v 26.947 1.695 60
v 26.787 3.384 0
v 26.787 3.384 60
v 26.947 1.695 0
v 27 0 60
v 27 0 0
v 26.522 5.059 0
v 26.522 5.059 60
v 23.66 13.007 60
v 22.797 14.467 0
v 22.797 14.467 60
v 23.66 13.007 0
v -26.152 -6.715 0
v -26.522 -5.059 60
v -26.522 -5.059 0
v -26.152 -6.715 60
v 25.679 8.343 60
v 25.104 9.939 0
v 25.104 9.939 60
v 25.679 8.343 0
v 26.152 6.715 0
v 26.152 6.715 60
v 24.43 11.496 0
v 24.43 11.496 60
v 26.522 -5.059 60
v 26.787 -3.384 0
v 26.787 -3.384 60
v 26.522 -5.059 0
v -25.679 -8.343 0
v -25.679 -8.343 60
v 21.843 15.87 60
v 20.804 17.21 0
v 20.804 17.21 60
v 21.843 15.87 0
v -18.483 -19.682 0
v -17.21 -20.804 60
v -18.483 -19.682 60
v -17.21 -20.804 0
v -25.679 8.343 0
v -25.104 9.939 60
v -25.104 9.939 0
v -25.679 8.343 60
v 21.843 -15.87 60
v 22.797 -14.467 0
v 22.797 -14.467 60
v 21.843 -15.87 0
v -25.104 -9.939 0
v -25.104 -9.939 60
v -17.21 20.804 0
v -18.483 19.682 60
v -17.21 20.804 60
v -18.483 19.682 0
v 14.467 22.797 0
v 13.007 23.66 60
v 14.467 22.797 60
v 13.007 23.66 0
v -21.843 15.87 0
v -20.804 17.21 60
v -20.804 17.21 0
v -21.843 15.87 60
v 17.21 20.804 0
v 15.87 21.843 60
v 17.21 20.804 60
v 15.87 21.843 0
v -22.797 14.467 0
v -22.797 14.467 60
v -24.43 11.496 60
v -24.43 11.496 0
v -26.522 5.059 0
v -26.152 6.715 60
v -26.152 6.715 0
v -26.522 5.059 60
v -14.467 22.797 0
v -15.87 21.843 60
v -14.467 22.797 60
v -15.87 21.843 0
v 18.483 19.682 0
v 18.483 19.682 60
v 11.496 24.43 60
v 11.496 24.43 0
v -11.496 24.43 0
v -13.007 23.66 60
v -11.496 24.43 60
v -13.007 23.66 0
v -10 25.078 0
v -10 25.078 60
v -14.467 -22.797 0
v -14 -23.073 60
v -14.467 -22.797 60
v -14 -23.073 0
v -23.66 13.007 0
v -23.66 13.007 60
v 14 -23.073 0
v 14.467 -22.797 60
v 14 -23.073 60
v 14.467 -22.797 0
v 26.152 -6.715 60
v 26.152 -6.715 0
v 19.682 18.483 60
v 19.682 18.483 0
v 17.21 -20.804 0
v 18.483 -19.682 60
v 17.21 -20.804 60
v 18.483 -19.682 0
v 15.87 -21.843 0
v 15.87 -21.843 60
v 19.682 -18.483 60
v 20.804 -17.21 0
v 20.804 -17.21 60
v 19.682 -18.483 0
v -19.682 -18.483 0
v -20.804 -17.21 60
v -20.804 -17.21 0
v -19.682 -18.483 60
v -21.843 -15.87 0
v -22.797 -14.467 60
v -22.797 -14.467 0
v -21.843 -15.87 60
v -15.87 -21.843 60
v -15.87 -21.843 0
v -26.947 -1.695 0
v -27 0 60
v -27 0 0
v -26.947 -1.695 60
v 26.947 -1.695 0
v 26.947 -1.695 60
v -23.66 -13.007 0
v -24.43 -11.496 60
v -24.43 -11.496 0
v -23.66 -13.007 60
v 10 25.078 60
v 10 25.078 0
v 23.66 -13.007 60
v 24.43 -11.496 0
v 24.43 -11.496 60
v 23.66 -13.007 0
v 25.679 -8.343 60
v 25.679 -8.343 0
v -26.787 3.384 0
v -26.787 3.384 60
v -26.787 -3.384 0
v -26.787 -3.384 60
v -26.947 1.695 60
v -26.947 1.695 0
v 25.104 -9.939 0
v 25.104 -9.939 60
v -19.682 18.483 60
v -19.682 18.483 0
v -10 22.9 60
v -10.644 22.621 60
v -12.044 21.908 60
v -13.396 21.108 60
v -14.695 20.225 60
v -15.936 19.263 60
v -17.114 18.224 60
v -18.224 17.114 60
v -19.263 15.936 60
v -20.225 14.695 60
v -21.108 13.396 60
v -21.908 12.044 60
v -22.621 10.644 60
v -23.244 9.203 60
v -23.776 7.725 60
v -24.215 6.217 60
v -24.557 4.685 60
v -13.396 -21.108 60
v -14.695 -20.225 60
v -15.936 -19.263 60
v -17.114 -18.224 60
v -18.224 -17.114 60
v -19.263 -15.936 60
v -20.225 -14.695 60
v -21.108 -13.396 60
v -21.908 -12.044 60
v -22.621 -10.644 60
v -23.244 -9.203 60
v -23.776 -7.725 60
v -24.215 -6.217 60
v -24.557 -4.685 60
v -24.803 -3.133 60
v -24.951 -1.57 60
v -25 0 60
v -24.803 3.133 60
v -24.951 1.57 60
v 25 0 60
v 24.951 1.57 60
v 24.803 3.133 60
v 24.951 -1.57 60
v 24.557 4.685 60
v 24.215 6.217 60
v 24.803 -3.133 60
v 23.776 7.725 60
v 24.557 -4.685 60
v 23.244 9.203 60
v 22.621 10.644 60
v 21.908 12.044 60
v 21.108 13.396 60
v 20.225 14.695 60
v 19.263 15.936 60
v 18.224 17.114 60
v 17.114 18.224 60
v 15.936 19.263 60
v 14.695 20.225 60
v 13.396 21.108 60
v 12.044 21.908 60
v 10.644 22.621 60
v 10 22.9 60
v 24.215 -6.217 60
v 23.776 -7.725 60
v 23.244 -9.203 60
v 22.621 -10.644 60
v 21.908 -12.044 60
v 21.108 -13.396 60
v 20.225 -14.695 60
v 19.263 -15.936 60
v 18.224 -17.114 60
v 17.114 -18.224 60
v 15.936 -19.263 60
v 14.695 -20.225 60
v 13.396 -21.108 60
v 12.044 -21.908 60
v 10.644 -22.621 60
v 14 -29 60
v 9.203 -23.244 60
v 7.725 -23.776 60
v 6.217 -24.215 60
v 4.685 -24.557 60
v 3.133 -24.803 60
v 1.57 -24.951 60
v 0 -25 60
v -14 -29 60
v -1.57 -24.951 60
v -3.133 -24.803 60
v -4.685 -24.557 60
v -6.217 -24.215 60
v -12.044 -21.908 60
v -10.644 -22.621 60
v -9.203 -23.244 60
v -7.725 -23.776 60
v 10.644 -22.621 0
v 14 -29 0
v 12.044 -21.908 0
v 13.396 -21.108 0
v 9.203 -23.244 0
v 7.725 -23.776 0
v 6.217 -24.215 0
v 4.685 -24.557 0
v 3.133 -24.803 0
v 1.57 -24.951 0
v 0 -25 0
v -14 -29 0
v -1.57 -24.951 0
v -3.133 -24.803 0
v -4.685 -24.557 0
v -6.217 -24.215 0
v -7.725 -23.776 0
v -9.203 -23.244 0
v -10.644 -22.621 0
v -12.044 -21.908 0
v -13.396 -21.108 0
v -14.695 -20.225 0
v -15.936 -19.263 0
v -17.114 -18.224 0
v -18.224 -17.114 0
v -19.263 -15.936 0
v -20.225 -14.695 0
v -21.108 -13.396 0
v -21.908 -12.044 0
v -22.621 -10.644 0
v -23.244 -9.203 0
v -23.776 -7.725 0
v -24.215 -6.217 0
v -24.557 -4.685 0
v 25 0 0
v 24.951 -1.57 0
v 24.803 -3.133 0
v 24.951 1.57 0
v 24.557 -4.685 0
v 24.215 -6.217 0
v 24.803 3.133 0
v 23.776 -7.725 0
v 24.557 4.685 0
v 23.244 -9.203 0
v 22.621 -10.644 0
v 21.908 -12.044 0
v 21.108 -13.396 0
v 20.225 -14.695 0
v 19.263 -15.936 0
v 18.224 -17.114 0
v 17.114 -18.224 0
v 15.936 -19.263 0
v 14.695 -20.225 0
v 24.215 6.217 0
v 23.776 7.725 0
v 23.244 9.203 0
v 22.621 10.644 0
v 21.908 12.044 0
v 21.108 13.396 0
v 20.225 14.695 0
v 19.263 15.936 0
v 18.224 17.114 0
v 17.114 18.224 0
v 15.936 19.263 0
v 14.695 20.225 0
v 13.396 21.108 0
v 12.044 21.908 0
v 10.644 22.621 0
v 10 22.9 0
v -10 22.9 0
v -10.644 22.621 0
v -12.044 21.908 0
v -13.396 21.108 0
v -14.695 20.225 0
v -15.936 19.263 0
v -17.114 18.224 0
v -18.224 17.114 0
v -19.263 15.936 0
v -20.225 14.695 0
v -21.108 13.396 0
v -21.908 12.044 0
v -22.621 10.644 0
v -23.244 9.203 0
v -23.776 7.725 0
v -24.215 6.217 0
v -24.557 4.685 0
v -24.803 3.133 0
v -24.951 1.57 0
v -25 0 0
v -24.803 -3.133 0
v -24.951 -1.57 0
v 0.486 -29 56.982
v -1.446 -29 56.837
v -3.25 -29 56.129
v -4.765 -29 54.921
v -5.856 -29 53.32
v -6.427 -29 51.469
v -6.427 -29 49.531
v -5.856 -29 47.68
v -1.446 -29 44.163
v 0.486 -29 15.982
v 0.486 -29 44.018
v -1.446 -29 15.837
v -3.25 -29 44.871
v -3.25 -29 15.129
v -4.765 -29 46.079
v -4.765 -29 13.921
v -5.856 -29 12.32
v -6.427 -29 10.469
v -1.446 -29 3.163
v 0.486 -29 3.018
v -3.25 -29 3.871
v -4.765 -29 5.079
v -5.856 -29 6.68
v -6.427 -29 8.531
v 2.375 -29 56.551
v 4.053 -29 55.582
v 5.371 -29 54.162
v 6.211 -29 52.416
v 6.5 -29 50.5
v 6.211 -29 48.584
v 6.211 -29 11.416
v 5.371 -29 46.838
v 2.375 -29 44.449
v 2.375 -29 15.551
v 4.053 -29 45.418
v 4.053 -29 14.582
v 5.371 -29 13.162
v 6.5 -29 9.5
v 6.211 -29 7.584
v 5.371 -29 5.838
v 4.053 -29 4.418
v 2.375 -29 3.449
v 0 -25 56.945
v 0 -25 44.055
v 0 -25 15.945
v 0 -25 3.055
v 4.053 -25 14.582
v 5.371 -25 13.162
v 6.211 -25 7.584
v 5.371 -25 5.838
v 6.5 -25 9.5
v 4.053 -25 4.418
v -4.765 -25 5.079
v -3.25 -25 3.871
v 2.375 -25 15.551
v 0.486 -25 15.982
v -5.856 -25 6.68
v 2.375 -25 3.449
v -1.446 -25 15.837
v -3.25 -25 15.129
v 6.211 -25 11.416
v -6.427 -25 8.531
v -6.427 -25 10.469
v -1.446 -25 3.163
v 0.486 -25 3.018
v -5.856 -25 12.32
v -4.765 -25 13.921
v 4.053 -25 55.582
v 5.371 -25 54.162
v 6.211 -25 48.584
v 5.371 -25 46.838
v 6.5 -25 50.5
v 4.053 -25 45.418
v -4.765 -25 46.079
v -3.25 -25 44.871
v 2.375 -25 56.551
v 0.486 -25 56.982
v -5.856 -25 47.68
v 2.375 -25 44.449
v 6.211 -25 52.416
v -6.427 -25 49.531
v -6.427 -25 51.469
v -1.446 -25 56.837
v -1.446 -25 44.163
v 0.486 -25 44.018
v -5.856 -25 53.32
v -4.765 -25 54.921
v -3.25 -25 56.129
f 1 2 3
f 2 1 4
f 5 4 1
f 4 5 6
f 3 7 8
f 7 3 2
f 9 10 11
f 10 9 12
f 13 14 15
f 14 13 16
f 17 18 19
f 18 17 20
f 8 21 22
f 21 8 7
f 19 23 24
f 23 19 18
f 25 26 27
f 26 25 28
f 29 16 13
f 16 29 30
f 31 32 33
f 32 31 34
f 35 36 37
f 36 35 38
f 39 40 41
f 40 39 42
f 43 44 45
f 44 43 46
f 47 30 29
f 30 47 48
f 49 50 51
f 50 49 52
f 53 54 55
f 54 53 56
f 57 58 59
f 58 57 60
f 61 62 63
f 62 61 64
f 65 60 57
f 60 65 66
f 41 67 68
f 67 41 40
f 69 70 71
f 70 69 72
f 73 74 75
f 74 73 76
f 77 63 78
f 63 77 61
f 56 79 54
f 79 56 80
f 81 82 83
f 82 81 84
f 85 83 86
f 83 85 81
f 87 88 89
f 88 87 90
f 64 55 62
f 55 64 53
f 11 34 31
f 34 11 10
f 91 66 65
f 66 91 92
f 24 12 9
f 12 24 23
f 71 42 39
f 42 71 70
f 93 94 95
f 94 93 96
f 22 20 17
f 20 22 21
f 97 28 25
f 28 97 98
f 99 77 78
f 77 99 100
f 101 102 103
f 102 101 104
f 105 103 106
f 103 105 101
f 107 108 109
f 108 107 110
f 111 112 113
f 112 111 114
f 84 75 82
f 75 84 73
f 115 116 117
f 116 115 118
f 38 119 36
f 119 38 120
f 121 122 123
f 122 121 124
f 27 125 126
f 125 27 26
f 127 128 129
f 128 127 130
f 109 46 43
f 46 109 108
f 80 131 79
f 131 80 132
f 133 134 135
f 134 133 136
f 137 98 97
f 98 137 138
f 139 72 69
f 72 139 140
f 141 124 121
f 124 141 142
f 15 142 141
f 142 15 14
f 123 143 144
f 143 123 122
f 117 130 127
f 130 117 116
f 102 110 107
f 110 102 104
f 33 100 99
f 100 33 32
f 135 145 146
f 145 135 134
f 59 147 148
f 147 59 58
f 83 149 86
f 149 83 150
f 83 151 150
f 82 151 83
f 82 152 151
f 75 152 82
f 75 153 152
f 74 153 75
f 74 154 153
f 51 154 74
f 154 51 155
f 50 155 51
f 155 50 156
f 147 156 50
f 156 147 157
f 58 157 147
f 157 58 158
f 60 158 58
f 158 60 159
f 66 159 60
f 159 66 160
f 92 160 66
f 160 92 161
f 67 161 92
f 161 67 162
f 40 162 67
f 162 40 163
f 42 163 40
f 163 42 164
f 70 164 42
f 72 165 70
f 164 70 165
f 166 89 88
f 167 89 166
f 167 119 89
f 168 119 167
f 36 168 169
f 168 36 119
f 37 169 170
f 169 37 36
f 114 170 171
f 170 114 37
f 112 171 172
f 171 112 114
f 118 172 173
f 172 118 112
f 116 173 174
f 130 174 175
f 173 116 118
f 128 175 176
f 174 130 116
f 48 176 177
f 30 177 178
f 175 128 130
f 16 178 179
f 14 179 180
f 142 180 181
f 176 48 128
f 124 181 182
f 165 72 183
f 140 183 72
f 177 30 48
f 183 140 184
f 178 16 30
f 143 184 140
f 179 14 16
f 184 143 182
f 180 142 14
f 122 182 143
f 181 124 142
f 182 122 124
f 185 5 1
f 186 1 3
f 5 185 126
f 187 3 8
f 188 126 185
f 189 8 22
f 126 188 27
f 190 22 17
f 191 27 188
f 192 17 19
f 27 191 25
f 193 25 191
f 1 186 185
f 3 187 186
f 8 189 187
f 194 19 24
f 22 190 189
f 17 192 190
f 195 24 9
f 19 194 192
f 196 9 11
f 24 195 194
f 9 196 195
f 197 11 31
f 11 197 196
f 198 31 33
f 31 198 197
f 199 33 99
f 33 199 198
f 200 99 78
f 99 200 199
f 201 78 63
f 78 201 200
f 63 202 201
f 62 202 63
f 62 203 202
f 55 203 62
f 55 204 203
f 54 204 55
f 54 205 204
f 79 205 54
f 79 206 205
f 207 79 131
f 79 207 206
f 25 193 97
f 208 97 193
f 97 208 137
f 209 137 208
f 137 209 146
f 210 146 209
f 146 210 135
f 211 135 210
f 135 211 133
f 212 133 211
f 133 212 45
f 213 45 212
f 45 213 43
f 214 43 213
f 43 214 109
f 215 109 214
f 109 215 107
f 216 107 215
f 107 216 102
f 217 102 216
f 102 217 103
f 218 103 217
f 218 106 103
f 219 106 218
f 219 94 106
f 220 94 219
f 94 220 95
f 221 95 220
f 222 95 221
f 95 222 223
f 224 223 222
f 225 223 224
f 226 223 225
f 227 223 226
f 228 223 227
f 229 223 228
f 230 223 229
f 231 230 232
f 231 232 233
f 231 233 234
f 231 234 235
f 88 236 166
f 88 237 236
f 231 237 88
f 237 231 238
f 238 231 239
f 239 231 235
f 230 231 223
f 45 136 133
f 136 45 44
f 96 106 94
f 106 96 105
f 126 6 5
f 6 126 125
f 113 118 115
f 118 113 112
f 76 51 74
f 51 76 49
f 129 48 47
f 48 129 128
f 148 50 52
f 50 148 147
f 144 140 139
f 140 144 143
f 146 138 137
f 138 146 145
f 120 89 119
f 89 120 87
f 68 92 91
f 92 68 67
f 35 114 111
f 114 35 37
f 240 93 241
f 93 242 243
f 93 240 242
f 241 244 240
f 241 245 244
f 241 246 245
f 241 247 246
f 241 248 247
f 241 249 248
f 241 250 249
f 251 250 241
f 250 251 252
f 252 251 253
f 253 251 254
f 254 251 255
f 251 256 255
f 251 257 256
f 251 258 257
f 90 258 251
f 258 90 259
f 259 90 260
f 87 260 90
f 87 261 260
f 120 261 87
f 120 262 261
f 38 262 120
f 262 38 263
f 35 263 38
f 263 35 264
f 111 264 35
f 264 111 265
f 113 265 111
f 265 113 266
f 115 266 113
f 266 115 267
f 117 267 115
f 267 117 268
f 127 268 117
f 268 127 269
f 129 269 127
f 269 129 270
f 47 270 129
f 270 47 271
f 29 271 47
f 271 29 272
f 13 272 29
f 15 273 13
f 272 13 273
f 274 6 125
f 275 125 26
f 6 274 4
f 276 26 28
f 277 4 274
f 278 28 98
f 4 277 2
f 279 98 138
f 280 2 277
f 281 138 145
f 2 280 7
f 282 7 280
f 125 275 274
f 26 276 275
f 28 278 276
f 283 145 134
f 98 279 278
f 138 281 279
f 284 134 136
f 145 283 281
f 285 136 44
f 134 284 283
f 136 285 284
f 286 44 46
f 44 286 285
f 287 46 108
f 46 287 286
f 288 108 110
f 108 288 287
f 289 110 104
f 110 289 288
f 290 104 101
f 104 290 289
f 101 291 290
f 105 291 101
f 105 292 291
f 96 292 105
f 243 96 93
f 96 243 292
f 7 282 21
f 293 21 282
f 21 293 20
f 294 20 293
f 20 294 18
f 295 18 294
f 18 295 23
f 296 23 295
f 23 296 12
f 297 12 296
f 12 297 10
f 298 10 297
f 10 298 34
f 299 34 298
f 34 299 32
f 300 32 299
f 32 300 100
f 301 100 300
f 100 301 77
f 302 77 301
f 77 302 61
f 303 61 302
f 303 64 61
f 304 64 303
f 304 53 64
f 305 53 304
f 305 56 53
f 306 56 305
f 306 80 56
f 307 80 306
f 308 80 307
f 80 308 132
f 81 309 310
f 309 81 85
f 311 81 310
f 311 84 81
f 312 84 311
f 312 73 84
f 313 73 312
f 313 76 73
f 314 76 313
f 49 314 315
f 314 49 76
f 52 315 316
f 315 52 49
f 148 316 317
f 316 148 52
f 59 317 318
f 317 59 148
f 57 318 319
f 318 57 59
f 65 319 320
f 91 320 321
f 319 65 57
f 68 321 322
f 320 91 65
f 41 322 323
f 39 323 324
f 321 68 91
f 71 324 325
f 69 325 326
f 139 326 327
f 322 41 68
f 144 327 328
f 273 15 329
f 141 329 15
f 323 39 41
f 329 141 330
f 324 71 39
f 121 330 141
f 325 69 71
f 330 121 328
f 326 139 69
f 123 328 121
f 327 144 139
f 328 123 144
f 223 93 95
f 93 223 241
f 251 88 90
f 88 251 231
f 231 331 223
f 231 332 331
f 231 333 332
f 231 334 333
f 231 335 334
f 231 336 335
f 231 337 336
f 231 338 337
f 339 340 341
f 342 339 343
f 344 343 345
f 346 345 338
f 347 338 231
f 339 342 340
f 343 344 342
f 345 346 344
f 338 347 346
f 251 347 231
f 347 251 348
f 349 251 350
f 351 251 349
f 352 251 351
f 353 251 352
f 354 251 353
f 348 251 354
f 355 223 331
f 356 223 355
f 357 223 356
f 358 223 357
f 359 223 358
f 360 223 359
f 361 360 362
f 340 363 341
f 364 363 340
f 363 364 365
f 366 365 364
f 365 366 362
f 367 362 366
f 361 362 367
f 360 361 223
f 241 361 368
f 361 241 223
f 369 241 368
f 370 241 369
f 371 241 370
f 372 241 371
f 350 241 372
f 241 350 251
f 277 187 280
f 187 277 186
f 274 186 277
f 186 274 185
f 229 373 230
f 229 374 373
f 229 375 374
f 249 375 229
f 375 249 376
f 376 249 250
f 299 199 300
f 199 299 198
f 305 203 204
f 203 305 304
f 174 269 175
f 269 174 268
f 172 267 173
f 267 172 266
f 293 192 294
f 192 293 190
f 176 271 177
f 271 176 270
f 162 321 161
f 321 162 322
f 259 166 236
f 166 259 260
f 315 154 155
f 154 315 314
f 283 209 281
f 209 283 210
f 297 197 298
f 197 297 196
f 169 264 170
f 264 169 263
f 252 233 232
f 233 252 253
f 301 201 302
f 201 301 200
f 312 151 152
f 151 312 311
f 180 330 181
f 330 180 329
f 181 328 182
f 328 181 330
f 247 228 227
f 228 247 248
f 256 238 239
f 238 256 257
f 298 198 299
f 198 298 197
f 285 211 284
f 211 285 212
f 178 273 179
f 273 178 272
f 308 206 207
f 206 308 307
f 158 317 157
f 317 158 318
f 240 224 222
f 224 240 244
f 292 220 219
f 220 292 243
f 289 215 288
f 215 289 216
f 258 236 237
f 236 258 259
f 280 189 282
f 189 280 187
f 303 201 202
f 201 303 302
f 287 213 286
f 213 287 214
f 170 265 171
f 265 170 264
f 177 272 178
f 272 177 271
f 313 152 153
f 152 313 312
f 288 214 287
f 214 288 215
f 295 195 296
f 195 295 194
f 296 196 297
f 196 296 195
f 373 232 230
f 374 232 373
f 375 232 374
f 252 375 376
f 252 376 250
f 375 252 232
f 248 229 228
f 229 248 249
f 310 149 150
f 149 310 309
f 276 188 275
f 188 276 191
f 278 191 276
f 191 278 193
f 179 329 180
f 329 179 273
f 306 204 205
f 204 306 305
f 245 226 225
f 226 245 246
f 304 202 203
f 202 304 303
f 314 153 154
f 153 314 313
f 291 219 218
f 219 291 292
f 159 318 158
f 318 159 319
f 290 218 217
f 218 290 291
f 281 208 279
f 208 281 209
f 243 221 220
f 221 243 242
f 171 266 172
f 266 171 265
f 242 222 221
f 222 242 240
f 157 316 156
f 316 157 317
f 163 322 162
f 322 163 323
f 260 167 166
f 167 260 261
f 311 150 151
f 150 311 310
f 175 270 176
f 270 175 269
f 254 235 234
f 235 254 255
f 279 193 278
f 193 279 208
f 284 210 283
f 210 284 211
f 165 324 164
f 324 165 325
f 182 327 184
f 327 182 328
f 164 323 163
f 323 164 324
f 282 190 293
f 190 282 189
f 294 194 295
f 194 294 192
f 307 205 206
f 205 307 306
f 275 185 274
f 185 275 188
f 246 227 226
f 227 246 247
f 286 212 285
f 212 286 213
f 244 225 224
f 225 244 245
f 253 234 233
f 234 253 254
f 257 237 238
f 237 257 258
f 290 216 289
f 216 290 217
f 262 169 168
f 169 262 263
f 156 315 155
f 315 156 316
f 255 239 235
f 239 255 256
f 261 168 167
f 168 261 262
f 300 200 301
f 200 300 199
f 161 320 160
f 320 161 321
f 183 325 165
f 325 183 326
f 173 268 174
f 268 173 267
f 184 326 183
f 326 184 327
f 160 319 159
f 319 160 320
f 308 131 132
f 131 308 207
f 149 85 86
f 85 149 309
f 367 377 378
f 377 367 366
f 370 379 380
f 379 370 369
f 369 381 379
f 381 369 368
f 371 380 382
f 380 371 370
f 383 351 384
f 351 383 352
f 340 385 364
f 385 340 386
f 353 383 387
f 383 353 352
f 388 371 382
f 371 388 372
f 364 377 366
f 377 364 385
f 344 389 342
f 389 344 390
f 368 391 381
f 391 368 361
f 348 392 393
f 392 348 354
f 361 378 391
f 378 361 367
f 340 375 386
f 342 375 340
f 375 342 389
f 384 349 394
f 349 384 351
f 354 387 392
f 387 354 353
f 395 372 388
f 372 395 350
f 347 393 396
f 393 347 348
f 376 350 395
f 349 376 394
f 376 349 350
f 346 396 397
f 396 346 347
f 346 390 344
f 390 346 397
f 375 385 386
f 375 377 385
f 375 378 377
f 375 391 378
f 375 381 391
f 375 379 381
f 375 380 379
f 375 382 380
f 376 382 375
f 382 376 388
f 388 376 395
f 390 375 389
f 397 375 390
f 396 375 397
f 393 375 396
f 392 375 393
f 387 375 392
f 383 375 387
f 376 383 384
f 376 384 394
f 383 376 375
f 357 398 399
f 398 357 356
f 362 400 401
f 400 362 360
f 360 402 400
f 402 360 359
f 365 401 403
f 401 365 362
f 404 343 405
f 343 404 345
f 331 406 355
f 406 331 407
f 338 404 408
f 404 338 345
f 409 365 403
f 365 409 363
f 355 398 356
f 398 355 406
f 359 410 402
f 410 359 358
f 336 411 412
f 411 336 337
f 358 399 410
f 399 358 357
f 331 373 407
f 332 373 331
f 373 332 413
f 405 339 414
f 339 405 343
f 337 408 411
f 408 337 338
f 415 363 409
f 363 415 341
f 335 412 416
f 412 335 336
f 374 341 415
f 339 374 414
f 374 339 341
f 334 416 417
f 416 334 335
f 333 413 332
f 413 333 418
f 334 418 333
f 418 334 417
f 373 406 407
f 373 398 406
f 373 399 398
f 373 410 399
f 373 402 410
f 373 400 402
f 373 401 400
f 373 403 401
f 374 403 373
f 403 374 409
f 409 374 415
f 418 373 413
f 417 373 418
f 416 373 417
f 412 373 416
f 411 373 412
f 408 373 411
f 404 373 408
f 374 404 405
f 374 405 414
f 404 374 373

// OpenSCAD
// Inner diameter (all measurements in mm)
inner_diameter = 50;

// Outer diameter
outer_diameter = 54;

// Width of the flat back
back_width = 28;

// Depth of the flat back (how far does the back stick out)
back_depth = 2;

// Total height
height = 60;

// Front cutout width
cutout_width = 20;

// How round do you want it to be?
facets=100;

// Magnet diameter
magnet_diameter = 13;

// Magnet depth
magnet_depth = 4;

// Distance of the magnets from the top and bottom 
edge_distance = 3;

difference()
{
    //make the outer shell
    union()
    {
        // round part
        cylinder(h = height, r = outer_diameter/2, $fn=facets);
        
        // flat back
        translate([-back_width/2,-outer_diameter/2-back_depth,0]) cube([back_width,outer_diameter/2,height]);
    }      
    // hollow out the cylinder
    cylinder(h = height, r = inner_diameter/2, $fn=facets);
    
    // cut the slot in the front
    translate([-cutout_width/2,outer_diameter/4,0]) cube([cutout_width,cutout_width,height]);

    //Magnet 1
    translate([0,-outer_diameter/2-back_depth,magnet_diameter/2+edge_distance]) rotate ([270,0,0])cylinder(h = magnet_depth, r = magnet_diameter/2);
    
    //Magnet 2
    translate([0,-outer_diameter/2-back_depth,height-magnet_diameter/2-edge_distance]) rotate ([270,0,0])cylinder(h = magnet_depth, r = magnet_diameter/2);

   
}
